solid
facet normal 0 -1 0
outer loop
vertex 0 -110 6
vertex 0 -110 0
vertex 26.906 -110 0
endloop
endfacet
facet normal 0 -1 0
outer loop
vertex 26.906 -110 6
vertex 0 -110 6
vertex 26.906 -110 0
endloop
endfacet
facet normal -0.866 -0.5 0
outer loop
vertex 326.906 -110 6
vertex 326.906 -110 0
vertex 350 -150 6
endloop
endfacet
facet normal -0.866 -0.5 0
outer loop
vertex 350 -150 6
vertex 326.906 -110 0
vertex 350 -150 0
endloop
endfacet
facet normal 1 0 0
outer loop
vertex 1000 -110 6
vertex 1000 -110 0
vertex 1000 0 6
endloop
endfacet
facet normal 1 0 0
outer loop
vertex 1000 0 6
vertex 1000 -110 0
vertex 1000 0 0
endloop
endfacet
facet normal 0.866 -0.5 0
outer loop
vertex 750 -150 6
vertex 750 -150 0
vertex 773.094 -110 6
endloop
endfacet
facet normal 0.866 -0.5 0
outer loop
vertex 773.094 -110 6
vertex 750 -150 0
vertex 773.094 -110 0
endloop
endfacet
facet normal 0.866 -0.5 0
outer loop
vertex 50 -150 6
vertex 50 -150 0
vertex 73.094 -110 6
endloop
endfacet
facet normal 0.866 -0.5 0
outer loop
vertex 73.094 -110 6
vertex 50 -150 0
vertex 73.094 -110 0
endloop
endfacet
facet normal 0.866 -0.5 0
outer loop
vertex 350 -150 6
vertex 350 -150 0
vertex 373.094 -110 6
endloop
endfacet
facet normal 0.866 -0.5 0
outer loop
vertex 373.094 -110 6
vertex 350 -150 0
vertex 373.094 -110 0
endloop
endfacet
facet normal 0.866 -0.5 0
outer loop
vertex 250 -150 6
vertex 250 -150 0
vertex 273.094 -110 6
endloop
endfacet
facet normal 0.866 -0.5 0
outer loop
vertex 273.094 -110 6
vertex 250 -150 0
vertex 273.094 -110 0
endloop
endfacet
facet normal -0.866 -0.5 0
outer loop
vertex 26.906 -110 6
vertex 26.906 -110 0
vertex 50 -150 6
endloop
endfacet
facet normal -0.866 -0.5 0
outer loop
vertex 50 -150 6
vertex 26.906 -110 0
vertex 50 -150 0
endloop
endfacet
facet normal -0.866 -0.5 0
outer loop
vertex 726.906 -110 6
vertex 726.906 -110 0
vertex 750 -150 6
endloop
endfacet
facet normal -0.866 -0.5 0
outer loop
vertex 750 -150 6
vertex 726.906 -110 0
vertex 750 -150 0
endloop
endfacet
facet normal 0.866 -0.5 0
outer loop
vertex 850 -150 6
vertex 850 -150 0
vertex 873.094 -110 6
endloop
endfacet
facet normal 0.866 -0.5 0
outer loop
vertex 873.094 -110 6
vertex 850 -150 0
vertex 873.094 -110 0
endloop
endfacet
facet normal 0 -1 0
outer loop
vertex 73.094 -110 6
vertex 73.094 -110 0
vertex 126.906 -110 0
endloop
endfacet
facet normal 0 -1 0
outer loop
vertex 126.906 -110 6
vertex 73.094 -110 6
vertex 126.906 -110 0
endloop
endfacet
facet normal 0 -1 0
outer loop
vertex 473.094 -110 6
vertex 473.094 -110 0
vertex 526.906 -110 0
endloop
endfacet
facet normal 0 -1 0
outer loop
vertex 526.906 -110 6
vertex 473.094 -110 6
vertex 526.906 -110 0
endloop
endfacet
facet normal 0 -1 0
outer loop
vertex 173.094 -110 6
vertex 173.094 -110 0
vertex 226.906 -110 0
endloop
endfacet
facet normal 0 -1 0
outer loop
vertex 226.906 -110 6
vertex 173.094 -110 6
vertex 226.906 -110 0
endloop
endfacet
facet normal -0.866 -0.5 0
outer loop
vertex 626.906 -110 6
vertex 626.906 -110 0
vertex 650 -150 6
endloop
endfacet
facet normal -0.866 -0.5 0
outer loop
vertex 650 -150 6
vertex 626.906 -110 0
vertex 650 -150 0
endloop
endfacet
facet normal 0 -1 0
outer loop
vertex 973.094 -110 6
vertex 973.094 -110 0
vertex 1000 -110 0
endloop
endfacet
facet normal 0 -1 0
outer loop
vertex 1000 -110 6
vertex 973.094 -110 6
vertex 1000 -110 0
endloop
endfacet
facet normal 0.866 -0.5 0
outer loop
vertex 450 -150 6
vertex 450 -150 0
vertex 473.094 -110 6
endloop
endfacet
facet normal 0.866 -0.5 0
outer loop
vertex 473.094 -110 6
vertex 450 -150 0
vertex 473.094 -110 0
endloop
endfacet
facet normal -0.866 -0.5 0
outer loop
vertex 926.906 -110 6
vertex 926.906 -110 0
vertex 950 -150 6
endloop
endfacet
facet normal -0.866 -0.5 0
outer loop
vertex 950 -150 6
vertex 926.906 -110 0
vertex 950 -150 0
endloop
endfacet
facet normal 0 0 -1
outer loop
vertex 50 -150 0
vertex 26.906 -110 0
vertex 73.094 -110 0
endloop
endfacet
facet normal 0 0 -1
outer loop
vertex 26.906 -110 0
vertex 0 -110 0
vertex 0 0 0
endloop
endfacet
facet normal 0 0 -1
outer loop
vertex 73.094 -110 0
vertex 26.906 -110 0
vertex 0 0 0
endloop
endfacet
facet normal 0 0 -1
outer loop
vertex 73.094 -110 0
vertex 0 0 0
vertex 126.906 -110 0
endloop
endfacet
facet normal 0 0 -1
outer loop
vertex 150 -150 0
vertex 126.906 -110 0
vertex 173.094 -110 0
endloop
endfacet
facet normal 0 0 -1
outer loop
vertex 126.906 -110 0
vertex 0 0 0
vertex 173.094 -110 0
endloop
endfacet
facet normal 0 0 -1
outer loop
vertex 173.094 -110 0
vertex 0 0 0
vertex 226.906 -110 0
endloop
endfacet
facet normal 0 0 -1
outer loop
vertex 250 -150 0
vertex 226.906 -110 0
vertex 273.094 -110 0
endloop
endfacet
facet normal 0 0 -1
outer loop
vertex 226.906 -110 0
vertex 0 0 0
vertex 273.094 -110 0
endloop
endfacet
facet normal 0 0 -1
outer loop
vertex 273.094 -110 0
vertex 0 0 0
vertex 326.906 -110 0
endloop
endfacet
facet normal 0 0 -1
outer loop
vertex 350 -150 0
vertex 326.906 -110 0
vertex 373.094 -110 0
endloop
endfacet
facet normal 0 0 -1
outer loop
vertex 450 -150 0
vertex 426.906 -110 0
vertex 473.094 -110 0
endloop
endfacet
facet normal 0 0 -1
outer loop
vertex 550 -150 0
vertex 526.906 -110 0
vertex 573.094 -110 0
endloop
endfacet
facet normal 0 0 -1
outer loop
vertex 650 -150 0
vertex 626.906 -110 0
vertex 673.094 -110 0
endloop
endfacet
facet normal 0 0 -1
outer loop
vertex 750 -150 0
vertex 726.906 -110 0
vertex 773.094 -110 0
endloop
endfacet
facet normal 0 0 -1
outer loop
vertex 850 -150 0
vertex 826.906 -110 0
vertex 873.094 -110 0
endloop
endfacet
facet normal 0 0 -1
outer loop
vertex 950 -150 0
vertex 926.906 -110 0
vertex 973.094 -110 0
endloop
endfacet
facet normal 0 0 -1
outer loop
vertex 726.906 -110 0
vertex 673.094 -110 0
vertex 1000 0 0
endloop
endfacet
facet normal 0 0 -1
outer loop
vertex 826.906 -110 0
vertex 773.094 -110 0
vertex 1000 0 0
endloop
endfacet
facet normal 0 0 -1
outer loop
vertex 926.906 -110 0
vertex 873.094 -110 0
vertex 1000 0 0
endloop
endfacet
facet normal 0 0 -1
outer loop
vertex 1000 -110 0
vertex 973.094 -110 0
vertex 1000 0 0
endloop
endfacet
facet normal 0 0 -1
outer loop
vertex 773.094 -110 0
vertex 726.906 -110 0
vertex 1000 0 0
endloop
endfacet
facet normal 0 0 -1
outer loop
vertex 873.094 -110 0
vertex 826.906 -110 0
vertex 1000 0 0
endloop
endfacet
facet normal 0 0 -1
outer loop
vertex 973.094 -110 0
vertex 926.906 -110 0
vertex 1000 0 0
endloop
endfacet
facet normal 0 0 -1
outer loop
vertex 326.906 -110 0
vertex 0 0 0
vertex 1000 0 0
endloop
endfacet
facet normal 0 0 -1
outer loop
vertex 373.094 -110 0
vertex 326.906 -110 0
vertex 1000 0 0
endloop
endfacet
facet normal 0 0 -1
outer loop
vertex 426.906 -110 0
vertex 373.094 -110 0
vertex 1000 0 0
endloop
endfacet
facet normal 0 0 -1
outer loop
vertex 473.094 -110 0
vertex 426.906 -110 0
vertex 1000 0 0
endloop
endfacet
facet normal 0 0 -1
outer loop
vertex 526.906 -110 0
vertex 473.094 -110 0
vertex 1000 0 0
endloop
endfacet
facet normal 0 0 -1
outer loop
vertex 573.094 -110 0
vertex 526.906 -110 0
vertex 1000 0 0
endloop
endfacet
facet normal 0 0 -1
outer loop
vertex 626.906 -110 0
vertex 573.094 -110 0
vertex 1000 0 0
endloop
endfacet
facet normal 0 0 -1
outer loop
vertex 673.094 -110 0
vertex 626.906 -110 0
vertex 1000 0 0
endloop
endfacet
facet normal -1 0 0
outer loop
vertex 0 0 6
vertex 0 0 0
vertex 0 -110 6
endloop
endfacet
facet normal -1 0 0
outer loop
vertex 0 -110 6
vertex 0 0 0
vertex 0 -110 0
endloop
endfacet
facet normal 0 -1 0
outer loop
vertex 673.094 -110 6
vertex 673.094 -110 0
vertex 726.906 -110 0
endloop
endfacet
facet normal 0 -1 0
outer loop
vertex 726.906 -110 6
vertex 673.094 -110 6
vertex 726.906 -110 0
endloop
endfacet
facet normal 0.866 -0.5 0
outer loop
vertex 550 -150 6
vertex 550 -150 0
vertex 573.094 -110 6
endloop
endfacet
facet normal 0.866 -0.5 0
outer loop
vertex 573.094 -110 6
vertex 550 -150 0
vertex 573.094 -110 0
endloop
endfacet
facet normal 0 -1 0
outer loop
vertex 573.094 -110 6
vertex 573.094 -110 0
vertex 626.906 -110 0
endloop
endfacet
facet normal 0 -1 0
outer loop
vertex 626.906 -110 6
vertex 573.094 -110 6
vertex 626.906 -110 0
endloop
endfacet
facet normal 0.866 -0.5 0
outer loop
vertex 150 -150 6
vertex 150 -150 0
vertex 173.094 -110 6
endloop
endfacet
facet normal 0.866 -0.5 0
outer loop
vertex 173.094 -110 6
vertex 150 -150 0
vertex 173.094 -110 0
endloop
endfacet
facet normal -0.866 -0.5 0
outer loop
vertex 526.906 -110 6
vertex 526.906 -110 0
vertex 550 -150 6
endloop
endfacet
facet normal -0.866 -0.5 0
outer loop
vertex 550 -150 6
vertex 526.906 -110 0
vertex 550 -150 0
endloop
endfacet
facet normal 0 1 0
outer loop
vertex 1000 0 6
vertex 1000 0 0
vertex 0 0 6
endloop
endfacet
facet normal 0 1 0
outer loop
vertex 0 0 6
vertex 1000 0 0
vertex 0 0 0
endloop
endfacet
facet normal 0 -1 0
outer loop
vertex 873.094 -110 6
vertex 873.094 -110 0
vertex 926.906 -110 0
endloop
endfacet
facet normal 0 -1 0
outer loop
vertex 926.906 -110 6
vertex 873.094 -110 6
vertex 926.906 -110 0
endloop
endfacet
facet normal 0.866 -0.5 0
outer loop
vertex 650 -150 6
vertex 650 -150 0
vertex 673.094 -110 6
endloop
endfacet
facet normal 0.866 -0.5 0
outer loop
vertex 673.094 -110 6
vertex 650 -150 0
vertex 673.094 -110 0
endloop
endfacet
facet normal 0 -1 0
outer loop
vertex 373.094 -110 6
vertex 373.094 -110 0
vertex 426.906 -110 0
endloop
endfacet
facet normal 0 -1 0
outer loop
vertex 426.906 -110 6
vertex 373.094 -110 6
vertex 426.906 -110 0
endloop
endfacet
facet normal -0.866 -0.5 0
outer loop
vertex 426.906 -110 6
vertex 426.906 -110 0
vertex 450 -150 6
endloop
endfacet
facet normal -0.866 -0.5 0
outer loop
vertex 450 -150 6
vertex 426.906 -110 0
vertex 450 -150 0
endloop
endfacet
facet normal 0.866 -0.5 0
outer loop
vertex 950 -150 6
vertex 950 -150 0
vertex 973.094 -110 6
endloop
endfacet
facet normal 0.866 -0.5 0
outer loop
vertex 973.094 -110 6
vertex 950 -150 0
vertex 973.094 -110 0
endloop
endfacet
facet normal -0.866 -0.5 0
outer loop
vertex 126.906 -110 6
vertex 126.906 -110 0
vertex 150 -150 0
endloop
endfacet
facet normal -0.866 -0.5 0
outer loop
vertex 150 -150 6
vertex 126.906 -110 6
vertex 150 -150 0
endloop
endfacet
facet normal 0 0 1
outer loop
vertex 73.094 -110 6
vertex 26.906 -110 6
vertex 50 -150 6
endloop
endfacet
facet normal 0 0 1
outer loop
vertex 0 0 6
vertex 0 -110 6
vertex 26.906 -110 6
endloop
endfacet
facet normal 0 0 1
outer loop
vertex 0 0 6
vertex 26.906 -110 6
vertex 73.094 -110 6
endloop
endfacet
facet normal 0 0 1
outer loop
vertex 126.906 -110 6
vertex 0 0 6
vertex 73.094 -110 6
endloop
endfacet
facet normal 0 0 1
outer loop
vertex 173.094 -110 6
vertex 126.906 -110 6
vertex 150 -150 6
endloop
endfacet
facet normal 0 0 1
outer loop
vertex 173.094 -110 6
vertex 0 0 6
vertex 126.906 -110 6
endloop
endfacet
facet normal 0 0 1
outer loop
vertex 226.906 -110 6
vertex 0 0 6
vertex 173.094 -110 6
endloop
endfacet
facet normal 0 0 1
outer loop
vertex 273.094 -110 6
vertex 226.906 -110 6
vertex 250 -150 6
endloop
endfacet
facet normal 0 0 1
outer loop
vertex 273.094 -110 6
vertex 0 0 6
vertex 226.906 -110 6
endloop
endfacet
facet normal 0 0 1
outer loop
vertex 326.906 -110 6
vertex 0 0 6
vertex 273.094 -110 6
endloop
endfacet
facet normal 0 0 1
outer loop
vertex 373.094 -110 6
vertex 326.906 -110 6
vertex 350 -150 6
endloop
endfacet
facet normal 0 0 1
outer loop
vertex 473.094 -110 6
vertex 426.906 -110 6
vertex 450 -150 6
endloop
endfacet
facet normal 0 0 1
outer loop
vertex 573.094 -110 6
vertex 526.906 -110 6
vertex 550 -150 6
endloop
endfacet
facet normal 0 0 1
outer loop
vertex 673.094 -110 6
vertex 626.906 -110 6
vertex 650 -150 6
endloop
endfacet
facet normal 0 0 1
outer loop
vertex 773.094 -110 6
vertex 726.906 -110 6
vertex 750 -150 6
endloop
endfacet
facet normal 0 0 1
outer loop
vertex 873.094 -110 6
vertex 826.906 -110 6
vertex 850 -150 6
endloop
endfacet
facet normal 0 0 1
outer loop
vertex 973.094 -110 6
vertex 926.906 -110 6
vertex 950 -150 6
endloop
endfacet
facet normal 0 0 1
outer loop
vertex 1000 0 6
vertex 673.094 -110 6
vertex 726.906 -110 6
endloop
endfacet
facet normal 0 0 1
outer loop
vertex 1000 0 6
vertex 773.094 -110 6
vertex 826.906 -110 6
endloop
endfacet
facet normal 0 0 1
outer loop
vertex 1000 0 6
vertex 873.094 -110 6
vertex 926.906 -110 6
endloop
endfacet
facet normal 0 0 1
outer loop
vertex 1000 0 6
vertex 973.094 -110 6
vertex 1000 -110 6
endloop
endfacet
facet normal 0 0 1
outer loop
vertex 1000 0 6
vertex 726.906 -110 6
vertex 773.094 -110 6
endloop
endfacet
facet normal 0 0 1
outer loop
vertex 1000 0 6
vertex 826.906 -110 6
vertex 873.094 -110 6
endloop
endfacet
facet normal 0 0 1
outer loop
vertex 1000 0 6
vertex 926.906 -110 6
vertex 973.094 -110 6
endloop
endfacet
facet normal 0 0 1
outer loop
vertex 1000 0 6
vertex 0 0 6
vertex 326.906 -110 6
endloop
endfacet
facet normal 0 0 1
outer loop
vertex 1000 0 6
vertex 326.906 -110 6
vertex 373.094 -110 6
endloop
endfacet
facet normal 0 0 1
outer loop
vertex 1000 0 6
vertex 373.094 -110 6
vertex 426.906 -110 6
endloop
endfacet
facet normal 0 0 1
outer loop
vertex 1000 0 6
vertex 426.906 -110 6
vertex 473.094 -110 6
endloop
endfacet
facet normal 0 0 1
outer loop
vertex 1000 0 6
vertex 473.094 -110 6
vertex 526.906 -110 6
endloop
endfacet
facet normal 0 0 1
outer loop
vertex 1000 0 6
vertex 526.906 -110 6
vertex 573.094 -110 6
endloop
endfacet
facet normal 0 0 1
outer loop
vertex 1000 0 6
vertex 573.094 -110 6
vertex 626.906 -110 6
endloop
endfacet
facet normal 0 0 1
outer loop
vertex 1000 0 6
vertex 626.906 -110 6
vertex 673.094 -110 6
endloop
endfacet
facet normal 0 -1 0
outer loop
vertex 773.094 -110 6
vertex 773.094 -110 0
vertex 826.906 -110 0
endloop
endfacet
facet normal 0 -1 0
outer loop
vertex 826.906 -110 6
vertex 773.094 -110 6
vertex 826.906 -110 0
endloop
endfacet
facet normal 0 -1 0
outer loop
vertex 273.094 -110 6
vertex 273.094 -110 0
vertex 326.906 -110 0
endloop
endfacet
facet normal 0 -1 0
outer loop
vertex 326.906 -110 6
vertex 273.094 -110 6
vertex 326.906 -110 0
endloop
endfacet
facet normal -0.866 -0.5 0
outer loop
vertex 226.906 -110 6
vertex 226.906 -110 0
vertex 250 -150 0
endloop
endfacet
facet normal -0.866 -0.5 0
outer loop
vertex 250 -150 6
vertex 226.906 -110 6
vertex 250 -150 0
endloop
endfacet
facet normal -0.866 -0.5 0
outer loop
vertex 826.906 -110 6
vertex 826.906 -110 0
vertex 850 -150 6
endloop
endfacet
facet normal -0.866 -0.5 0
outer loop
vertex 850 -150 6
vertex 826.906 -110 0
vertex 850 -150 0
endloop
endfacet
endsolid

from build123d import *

# Parameters (mm, degrees)
F1_DEPTH = 6


with BuildPart() as f1:
    # F0 (on Top) → F1 (new body)
    with BuildSketch(Plane.XY):
        Polygon((1000, 0), (0, 0), (0, -63.39746), (26.905989, -110), (73.094011, -110), (100, -63.39746), (126.905989, -110), (173.094011, -110), (200, -63.39746), (226.905989, -110), (273.094011, -110), (300, -63.39746), (326.905989, -110), (373.094011, -110), (400, -63.39746), (426.905989, -110), (473.094011, -110), (500, -63.39746), (526.905989, -110), (573.094011, -110), (600, -63.39746), (626.905989, -110), (673.094011, -110), (700, -63.39746), (726.905989, -110), (773.094011, -110), (800, -63.39746), (826.905989, -110), (873.094011, -110), (900, -63.39746), (926.905989, -110), (973.094011, -110), (1000, -63.39746), align=None)
        Polygon((26.905989, -110), (0, -63.39746), (0, -110), align=None)
        Polygon((1000, -110), (1000, -63.39746), (973.094011, -110), align=None)
        Polygon((73.094011, -110), (26.905989, -110), (50, -150), align=None)
        Polygon((950, -150), (973.094011, -110), (926.905989, -110), align=None)
        Polygon((100, -63.39746), (73.094011, -110), (126.905989, -110), align=None)
        Polygon((873.094011, -110), (926.905989, -110), (900, -63.39746), align=None)
        Polygon((173.094011, -110), (126.905989, -110), (150, -150), align=None)
        Polygon((850, -150), (873.094011, -110), (826.905989, -110), align=None)
        Polygon((200, -63.39746), (173.094011, -110), (226.905989, -110), align=None)
        Polygon((773.094011, -110), (826.905989, -110), (800, -63.39746), align=None)
        Polygon((273.094011, -110), (226.905989, -110), (250, -150), align=None)
        Polygon((750, -150), (773.094011, -110), (726.905989, -110), align=None)
        Polygon((300, -63.39746), (273.094011, -110), (326.905989, -110), align=None)
        Polygon((673.094011, -110), (726.905989, -110), (700, -63.39746), align=None)
        Polygon((373.094011, -110), (326.905989, -110), (350, -150), align=None)
        Polygon((650, -150), (673.094011, -110), (626.905989, -110), align=None)
        Polygon((400, -63.39746), (373.094011, -110), (426.905989, -110), align=None)
        Polygon((573.094011, -110), (626.905989, -110), (600, -63.39746), align=None)
        Polygon((473.094011, -110), (426.905989, -110), (450, -150), align=None)
        Polygon((550, -150), (573.094011, -110), (526.905989, -110), align=None)
        Polygon((500, -63.39746), (473.094011, -110), (526.905989, -110), align=None)
    extrude(amount=F1_DEPTH)


solid = f1.part
